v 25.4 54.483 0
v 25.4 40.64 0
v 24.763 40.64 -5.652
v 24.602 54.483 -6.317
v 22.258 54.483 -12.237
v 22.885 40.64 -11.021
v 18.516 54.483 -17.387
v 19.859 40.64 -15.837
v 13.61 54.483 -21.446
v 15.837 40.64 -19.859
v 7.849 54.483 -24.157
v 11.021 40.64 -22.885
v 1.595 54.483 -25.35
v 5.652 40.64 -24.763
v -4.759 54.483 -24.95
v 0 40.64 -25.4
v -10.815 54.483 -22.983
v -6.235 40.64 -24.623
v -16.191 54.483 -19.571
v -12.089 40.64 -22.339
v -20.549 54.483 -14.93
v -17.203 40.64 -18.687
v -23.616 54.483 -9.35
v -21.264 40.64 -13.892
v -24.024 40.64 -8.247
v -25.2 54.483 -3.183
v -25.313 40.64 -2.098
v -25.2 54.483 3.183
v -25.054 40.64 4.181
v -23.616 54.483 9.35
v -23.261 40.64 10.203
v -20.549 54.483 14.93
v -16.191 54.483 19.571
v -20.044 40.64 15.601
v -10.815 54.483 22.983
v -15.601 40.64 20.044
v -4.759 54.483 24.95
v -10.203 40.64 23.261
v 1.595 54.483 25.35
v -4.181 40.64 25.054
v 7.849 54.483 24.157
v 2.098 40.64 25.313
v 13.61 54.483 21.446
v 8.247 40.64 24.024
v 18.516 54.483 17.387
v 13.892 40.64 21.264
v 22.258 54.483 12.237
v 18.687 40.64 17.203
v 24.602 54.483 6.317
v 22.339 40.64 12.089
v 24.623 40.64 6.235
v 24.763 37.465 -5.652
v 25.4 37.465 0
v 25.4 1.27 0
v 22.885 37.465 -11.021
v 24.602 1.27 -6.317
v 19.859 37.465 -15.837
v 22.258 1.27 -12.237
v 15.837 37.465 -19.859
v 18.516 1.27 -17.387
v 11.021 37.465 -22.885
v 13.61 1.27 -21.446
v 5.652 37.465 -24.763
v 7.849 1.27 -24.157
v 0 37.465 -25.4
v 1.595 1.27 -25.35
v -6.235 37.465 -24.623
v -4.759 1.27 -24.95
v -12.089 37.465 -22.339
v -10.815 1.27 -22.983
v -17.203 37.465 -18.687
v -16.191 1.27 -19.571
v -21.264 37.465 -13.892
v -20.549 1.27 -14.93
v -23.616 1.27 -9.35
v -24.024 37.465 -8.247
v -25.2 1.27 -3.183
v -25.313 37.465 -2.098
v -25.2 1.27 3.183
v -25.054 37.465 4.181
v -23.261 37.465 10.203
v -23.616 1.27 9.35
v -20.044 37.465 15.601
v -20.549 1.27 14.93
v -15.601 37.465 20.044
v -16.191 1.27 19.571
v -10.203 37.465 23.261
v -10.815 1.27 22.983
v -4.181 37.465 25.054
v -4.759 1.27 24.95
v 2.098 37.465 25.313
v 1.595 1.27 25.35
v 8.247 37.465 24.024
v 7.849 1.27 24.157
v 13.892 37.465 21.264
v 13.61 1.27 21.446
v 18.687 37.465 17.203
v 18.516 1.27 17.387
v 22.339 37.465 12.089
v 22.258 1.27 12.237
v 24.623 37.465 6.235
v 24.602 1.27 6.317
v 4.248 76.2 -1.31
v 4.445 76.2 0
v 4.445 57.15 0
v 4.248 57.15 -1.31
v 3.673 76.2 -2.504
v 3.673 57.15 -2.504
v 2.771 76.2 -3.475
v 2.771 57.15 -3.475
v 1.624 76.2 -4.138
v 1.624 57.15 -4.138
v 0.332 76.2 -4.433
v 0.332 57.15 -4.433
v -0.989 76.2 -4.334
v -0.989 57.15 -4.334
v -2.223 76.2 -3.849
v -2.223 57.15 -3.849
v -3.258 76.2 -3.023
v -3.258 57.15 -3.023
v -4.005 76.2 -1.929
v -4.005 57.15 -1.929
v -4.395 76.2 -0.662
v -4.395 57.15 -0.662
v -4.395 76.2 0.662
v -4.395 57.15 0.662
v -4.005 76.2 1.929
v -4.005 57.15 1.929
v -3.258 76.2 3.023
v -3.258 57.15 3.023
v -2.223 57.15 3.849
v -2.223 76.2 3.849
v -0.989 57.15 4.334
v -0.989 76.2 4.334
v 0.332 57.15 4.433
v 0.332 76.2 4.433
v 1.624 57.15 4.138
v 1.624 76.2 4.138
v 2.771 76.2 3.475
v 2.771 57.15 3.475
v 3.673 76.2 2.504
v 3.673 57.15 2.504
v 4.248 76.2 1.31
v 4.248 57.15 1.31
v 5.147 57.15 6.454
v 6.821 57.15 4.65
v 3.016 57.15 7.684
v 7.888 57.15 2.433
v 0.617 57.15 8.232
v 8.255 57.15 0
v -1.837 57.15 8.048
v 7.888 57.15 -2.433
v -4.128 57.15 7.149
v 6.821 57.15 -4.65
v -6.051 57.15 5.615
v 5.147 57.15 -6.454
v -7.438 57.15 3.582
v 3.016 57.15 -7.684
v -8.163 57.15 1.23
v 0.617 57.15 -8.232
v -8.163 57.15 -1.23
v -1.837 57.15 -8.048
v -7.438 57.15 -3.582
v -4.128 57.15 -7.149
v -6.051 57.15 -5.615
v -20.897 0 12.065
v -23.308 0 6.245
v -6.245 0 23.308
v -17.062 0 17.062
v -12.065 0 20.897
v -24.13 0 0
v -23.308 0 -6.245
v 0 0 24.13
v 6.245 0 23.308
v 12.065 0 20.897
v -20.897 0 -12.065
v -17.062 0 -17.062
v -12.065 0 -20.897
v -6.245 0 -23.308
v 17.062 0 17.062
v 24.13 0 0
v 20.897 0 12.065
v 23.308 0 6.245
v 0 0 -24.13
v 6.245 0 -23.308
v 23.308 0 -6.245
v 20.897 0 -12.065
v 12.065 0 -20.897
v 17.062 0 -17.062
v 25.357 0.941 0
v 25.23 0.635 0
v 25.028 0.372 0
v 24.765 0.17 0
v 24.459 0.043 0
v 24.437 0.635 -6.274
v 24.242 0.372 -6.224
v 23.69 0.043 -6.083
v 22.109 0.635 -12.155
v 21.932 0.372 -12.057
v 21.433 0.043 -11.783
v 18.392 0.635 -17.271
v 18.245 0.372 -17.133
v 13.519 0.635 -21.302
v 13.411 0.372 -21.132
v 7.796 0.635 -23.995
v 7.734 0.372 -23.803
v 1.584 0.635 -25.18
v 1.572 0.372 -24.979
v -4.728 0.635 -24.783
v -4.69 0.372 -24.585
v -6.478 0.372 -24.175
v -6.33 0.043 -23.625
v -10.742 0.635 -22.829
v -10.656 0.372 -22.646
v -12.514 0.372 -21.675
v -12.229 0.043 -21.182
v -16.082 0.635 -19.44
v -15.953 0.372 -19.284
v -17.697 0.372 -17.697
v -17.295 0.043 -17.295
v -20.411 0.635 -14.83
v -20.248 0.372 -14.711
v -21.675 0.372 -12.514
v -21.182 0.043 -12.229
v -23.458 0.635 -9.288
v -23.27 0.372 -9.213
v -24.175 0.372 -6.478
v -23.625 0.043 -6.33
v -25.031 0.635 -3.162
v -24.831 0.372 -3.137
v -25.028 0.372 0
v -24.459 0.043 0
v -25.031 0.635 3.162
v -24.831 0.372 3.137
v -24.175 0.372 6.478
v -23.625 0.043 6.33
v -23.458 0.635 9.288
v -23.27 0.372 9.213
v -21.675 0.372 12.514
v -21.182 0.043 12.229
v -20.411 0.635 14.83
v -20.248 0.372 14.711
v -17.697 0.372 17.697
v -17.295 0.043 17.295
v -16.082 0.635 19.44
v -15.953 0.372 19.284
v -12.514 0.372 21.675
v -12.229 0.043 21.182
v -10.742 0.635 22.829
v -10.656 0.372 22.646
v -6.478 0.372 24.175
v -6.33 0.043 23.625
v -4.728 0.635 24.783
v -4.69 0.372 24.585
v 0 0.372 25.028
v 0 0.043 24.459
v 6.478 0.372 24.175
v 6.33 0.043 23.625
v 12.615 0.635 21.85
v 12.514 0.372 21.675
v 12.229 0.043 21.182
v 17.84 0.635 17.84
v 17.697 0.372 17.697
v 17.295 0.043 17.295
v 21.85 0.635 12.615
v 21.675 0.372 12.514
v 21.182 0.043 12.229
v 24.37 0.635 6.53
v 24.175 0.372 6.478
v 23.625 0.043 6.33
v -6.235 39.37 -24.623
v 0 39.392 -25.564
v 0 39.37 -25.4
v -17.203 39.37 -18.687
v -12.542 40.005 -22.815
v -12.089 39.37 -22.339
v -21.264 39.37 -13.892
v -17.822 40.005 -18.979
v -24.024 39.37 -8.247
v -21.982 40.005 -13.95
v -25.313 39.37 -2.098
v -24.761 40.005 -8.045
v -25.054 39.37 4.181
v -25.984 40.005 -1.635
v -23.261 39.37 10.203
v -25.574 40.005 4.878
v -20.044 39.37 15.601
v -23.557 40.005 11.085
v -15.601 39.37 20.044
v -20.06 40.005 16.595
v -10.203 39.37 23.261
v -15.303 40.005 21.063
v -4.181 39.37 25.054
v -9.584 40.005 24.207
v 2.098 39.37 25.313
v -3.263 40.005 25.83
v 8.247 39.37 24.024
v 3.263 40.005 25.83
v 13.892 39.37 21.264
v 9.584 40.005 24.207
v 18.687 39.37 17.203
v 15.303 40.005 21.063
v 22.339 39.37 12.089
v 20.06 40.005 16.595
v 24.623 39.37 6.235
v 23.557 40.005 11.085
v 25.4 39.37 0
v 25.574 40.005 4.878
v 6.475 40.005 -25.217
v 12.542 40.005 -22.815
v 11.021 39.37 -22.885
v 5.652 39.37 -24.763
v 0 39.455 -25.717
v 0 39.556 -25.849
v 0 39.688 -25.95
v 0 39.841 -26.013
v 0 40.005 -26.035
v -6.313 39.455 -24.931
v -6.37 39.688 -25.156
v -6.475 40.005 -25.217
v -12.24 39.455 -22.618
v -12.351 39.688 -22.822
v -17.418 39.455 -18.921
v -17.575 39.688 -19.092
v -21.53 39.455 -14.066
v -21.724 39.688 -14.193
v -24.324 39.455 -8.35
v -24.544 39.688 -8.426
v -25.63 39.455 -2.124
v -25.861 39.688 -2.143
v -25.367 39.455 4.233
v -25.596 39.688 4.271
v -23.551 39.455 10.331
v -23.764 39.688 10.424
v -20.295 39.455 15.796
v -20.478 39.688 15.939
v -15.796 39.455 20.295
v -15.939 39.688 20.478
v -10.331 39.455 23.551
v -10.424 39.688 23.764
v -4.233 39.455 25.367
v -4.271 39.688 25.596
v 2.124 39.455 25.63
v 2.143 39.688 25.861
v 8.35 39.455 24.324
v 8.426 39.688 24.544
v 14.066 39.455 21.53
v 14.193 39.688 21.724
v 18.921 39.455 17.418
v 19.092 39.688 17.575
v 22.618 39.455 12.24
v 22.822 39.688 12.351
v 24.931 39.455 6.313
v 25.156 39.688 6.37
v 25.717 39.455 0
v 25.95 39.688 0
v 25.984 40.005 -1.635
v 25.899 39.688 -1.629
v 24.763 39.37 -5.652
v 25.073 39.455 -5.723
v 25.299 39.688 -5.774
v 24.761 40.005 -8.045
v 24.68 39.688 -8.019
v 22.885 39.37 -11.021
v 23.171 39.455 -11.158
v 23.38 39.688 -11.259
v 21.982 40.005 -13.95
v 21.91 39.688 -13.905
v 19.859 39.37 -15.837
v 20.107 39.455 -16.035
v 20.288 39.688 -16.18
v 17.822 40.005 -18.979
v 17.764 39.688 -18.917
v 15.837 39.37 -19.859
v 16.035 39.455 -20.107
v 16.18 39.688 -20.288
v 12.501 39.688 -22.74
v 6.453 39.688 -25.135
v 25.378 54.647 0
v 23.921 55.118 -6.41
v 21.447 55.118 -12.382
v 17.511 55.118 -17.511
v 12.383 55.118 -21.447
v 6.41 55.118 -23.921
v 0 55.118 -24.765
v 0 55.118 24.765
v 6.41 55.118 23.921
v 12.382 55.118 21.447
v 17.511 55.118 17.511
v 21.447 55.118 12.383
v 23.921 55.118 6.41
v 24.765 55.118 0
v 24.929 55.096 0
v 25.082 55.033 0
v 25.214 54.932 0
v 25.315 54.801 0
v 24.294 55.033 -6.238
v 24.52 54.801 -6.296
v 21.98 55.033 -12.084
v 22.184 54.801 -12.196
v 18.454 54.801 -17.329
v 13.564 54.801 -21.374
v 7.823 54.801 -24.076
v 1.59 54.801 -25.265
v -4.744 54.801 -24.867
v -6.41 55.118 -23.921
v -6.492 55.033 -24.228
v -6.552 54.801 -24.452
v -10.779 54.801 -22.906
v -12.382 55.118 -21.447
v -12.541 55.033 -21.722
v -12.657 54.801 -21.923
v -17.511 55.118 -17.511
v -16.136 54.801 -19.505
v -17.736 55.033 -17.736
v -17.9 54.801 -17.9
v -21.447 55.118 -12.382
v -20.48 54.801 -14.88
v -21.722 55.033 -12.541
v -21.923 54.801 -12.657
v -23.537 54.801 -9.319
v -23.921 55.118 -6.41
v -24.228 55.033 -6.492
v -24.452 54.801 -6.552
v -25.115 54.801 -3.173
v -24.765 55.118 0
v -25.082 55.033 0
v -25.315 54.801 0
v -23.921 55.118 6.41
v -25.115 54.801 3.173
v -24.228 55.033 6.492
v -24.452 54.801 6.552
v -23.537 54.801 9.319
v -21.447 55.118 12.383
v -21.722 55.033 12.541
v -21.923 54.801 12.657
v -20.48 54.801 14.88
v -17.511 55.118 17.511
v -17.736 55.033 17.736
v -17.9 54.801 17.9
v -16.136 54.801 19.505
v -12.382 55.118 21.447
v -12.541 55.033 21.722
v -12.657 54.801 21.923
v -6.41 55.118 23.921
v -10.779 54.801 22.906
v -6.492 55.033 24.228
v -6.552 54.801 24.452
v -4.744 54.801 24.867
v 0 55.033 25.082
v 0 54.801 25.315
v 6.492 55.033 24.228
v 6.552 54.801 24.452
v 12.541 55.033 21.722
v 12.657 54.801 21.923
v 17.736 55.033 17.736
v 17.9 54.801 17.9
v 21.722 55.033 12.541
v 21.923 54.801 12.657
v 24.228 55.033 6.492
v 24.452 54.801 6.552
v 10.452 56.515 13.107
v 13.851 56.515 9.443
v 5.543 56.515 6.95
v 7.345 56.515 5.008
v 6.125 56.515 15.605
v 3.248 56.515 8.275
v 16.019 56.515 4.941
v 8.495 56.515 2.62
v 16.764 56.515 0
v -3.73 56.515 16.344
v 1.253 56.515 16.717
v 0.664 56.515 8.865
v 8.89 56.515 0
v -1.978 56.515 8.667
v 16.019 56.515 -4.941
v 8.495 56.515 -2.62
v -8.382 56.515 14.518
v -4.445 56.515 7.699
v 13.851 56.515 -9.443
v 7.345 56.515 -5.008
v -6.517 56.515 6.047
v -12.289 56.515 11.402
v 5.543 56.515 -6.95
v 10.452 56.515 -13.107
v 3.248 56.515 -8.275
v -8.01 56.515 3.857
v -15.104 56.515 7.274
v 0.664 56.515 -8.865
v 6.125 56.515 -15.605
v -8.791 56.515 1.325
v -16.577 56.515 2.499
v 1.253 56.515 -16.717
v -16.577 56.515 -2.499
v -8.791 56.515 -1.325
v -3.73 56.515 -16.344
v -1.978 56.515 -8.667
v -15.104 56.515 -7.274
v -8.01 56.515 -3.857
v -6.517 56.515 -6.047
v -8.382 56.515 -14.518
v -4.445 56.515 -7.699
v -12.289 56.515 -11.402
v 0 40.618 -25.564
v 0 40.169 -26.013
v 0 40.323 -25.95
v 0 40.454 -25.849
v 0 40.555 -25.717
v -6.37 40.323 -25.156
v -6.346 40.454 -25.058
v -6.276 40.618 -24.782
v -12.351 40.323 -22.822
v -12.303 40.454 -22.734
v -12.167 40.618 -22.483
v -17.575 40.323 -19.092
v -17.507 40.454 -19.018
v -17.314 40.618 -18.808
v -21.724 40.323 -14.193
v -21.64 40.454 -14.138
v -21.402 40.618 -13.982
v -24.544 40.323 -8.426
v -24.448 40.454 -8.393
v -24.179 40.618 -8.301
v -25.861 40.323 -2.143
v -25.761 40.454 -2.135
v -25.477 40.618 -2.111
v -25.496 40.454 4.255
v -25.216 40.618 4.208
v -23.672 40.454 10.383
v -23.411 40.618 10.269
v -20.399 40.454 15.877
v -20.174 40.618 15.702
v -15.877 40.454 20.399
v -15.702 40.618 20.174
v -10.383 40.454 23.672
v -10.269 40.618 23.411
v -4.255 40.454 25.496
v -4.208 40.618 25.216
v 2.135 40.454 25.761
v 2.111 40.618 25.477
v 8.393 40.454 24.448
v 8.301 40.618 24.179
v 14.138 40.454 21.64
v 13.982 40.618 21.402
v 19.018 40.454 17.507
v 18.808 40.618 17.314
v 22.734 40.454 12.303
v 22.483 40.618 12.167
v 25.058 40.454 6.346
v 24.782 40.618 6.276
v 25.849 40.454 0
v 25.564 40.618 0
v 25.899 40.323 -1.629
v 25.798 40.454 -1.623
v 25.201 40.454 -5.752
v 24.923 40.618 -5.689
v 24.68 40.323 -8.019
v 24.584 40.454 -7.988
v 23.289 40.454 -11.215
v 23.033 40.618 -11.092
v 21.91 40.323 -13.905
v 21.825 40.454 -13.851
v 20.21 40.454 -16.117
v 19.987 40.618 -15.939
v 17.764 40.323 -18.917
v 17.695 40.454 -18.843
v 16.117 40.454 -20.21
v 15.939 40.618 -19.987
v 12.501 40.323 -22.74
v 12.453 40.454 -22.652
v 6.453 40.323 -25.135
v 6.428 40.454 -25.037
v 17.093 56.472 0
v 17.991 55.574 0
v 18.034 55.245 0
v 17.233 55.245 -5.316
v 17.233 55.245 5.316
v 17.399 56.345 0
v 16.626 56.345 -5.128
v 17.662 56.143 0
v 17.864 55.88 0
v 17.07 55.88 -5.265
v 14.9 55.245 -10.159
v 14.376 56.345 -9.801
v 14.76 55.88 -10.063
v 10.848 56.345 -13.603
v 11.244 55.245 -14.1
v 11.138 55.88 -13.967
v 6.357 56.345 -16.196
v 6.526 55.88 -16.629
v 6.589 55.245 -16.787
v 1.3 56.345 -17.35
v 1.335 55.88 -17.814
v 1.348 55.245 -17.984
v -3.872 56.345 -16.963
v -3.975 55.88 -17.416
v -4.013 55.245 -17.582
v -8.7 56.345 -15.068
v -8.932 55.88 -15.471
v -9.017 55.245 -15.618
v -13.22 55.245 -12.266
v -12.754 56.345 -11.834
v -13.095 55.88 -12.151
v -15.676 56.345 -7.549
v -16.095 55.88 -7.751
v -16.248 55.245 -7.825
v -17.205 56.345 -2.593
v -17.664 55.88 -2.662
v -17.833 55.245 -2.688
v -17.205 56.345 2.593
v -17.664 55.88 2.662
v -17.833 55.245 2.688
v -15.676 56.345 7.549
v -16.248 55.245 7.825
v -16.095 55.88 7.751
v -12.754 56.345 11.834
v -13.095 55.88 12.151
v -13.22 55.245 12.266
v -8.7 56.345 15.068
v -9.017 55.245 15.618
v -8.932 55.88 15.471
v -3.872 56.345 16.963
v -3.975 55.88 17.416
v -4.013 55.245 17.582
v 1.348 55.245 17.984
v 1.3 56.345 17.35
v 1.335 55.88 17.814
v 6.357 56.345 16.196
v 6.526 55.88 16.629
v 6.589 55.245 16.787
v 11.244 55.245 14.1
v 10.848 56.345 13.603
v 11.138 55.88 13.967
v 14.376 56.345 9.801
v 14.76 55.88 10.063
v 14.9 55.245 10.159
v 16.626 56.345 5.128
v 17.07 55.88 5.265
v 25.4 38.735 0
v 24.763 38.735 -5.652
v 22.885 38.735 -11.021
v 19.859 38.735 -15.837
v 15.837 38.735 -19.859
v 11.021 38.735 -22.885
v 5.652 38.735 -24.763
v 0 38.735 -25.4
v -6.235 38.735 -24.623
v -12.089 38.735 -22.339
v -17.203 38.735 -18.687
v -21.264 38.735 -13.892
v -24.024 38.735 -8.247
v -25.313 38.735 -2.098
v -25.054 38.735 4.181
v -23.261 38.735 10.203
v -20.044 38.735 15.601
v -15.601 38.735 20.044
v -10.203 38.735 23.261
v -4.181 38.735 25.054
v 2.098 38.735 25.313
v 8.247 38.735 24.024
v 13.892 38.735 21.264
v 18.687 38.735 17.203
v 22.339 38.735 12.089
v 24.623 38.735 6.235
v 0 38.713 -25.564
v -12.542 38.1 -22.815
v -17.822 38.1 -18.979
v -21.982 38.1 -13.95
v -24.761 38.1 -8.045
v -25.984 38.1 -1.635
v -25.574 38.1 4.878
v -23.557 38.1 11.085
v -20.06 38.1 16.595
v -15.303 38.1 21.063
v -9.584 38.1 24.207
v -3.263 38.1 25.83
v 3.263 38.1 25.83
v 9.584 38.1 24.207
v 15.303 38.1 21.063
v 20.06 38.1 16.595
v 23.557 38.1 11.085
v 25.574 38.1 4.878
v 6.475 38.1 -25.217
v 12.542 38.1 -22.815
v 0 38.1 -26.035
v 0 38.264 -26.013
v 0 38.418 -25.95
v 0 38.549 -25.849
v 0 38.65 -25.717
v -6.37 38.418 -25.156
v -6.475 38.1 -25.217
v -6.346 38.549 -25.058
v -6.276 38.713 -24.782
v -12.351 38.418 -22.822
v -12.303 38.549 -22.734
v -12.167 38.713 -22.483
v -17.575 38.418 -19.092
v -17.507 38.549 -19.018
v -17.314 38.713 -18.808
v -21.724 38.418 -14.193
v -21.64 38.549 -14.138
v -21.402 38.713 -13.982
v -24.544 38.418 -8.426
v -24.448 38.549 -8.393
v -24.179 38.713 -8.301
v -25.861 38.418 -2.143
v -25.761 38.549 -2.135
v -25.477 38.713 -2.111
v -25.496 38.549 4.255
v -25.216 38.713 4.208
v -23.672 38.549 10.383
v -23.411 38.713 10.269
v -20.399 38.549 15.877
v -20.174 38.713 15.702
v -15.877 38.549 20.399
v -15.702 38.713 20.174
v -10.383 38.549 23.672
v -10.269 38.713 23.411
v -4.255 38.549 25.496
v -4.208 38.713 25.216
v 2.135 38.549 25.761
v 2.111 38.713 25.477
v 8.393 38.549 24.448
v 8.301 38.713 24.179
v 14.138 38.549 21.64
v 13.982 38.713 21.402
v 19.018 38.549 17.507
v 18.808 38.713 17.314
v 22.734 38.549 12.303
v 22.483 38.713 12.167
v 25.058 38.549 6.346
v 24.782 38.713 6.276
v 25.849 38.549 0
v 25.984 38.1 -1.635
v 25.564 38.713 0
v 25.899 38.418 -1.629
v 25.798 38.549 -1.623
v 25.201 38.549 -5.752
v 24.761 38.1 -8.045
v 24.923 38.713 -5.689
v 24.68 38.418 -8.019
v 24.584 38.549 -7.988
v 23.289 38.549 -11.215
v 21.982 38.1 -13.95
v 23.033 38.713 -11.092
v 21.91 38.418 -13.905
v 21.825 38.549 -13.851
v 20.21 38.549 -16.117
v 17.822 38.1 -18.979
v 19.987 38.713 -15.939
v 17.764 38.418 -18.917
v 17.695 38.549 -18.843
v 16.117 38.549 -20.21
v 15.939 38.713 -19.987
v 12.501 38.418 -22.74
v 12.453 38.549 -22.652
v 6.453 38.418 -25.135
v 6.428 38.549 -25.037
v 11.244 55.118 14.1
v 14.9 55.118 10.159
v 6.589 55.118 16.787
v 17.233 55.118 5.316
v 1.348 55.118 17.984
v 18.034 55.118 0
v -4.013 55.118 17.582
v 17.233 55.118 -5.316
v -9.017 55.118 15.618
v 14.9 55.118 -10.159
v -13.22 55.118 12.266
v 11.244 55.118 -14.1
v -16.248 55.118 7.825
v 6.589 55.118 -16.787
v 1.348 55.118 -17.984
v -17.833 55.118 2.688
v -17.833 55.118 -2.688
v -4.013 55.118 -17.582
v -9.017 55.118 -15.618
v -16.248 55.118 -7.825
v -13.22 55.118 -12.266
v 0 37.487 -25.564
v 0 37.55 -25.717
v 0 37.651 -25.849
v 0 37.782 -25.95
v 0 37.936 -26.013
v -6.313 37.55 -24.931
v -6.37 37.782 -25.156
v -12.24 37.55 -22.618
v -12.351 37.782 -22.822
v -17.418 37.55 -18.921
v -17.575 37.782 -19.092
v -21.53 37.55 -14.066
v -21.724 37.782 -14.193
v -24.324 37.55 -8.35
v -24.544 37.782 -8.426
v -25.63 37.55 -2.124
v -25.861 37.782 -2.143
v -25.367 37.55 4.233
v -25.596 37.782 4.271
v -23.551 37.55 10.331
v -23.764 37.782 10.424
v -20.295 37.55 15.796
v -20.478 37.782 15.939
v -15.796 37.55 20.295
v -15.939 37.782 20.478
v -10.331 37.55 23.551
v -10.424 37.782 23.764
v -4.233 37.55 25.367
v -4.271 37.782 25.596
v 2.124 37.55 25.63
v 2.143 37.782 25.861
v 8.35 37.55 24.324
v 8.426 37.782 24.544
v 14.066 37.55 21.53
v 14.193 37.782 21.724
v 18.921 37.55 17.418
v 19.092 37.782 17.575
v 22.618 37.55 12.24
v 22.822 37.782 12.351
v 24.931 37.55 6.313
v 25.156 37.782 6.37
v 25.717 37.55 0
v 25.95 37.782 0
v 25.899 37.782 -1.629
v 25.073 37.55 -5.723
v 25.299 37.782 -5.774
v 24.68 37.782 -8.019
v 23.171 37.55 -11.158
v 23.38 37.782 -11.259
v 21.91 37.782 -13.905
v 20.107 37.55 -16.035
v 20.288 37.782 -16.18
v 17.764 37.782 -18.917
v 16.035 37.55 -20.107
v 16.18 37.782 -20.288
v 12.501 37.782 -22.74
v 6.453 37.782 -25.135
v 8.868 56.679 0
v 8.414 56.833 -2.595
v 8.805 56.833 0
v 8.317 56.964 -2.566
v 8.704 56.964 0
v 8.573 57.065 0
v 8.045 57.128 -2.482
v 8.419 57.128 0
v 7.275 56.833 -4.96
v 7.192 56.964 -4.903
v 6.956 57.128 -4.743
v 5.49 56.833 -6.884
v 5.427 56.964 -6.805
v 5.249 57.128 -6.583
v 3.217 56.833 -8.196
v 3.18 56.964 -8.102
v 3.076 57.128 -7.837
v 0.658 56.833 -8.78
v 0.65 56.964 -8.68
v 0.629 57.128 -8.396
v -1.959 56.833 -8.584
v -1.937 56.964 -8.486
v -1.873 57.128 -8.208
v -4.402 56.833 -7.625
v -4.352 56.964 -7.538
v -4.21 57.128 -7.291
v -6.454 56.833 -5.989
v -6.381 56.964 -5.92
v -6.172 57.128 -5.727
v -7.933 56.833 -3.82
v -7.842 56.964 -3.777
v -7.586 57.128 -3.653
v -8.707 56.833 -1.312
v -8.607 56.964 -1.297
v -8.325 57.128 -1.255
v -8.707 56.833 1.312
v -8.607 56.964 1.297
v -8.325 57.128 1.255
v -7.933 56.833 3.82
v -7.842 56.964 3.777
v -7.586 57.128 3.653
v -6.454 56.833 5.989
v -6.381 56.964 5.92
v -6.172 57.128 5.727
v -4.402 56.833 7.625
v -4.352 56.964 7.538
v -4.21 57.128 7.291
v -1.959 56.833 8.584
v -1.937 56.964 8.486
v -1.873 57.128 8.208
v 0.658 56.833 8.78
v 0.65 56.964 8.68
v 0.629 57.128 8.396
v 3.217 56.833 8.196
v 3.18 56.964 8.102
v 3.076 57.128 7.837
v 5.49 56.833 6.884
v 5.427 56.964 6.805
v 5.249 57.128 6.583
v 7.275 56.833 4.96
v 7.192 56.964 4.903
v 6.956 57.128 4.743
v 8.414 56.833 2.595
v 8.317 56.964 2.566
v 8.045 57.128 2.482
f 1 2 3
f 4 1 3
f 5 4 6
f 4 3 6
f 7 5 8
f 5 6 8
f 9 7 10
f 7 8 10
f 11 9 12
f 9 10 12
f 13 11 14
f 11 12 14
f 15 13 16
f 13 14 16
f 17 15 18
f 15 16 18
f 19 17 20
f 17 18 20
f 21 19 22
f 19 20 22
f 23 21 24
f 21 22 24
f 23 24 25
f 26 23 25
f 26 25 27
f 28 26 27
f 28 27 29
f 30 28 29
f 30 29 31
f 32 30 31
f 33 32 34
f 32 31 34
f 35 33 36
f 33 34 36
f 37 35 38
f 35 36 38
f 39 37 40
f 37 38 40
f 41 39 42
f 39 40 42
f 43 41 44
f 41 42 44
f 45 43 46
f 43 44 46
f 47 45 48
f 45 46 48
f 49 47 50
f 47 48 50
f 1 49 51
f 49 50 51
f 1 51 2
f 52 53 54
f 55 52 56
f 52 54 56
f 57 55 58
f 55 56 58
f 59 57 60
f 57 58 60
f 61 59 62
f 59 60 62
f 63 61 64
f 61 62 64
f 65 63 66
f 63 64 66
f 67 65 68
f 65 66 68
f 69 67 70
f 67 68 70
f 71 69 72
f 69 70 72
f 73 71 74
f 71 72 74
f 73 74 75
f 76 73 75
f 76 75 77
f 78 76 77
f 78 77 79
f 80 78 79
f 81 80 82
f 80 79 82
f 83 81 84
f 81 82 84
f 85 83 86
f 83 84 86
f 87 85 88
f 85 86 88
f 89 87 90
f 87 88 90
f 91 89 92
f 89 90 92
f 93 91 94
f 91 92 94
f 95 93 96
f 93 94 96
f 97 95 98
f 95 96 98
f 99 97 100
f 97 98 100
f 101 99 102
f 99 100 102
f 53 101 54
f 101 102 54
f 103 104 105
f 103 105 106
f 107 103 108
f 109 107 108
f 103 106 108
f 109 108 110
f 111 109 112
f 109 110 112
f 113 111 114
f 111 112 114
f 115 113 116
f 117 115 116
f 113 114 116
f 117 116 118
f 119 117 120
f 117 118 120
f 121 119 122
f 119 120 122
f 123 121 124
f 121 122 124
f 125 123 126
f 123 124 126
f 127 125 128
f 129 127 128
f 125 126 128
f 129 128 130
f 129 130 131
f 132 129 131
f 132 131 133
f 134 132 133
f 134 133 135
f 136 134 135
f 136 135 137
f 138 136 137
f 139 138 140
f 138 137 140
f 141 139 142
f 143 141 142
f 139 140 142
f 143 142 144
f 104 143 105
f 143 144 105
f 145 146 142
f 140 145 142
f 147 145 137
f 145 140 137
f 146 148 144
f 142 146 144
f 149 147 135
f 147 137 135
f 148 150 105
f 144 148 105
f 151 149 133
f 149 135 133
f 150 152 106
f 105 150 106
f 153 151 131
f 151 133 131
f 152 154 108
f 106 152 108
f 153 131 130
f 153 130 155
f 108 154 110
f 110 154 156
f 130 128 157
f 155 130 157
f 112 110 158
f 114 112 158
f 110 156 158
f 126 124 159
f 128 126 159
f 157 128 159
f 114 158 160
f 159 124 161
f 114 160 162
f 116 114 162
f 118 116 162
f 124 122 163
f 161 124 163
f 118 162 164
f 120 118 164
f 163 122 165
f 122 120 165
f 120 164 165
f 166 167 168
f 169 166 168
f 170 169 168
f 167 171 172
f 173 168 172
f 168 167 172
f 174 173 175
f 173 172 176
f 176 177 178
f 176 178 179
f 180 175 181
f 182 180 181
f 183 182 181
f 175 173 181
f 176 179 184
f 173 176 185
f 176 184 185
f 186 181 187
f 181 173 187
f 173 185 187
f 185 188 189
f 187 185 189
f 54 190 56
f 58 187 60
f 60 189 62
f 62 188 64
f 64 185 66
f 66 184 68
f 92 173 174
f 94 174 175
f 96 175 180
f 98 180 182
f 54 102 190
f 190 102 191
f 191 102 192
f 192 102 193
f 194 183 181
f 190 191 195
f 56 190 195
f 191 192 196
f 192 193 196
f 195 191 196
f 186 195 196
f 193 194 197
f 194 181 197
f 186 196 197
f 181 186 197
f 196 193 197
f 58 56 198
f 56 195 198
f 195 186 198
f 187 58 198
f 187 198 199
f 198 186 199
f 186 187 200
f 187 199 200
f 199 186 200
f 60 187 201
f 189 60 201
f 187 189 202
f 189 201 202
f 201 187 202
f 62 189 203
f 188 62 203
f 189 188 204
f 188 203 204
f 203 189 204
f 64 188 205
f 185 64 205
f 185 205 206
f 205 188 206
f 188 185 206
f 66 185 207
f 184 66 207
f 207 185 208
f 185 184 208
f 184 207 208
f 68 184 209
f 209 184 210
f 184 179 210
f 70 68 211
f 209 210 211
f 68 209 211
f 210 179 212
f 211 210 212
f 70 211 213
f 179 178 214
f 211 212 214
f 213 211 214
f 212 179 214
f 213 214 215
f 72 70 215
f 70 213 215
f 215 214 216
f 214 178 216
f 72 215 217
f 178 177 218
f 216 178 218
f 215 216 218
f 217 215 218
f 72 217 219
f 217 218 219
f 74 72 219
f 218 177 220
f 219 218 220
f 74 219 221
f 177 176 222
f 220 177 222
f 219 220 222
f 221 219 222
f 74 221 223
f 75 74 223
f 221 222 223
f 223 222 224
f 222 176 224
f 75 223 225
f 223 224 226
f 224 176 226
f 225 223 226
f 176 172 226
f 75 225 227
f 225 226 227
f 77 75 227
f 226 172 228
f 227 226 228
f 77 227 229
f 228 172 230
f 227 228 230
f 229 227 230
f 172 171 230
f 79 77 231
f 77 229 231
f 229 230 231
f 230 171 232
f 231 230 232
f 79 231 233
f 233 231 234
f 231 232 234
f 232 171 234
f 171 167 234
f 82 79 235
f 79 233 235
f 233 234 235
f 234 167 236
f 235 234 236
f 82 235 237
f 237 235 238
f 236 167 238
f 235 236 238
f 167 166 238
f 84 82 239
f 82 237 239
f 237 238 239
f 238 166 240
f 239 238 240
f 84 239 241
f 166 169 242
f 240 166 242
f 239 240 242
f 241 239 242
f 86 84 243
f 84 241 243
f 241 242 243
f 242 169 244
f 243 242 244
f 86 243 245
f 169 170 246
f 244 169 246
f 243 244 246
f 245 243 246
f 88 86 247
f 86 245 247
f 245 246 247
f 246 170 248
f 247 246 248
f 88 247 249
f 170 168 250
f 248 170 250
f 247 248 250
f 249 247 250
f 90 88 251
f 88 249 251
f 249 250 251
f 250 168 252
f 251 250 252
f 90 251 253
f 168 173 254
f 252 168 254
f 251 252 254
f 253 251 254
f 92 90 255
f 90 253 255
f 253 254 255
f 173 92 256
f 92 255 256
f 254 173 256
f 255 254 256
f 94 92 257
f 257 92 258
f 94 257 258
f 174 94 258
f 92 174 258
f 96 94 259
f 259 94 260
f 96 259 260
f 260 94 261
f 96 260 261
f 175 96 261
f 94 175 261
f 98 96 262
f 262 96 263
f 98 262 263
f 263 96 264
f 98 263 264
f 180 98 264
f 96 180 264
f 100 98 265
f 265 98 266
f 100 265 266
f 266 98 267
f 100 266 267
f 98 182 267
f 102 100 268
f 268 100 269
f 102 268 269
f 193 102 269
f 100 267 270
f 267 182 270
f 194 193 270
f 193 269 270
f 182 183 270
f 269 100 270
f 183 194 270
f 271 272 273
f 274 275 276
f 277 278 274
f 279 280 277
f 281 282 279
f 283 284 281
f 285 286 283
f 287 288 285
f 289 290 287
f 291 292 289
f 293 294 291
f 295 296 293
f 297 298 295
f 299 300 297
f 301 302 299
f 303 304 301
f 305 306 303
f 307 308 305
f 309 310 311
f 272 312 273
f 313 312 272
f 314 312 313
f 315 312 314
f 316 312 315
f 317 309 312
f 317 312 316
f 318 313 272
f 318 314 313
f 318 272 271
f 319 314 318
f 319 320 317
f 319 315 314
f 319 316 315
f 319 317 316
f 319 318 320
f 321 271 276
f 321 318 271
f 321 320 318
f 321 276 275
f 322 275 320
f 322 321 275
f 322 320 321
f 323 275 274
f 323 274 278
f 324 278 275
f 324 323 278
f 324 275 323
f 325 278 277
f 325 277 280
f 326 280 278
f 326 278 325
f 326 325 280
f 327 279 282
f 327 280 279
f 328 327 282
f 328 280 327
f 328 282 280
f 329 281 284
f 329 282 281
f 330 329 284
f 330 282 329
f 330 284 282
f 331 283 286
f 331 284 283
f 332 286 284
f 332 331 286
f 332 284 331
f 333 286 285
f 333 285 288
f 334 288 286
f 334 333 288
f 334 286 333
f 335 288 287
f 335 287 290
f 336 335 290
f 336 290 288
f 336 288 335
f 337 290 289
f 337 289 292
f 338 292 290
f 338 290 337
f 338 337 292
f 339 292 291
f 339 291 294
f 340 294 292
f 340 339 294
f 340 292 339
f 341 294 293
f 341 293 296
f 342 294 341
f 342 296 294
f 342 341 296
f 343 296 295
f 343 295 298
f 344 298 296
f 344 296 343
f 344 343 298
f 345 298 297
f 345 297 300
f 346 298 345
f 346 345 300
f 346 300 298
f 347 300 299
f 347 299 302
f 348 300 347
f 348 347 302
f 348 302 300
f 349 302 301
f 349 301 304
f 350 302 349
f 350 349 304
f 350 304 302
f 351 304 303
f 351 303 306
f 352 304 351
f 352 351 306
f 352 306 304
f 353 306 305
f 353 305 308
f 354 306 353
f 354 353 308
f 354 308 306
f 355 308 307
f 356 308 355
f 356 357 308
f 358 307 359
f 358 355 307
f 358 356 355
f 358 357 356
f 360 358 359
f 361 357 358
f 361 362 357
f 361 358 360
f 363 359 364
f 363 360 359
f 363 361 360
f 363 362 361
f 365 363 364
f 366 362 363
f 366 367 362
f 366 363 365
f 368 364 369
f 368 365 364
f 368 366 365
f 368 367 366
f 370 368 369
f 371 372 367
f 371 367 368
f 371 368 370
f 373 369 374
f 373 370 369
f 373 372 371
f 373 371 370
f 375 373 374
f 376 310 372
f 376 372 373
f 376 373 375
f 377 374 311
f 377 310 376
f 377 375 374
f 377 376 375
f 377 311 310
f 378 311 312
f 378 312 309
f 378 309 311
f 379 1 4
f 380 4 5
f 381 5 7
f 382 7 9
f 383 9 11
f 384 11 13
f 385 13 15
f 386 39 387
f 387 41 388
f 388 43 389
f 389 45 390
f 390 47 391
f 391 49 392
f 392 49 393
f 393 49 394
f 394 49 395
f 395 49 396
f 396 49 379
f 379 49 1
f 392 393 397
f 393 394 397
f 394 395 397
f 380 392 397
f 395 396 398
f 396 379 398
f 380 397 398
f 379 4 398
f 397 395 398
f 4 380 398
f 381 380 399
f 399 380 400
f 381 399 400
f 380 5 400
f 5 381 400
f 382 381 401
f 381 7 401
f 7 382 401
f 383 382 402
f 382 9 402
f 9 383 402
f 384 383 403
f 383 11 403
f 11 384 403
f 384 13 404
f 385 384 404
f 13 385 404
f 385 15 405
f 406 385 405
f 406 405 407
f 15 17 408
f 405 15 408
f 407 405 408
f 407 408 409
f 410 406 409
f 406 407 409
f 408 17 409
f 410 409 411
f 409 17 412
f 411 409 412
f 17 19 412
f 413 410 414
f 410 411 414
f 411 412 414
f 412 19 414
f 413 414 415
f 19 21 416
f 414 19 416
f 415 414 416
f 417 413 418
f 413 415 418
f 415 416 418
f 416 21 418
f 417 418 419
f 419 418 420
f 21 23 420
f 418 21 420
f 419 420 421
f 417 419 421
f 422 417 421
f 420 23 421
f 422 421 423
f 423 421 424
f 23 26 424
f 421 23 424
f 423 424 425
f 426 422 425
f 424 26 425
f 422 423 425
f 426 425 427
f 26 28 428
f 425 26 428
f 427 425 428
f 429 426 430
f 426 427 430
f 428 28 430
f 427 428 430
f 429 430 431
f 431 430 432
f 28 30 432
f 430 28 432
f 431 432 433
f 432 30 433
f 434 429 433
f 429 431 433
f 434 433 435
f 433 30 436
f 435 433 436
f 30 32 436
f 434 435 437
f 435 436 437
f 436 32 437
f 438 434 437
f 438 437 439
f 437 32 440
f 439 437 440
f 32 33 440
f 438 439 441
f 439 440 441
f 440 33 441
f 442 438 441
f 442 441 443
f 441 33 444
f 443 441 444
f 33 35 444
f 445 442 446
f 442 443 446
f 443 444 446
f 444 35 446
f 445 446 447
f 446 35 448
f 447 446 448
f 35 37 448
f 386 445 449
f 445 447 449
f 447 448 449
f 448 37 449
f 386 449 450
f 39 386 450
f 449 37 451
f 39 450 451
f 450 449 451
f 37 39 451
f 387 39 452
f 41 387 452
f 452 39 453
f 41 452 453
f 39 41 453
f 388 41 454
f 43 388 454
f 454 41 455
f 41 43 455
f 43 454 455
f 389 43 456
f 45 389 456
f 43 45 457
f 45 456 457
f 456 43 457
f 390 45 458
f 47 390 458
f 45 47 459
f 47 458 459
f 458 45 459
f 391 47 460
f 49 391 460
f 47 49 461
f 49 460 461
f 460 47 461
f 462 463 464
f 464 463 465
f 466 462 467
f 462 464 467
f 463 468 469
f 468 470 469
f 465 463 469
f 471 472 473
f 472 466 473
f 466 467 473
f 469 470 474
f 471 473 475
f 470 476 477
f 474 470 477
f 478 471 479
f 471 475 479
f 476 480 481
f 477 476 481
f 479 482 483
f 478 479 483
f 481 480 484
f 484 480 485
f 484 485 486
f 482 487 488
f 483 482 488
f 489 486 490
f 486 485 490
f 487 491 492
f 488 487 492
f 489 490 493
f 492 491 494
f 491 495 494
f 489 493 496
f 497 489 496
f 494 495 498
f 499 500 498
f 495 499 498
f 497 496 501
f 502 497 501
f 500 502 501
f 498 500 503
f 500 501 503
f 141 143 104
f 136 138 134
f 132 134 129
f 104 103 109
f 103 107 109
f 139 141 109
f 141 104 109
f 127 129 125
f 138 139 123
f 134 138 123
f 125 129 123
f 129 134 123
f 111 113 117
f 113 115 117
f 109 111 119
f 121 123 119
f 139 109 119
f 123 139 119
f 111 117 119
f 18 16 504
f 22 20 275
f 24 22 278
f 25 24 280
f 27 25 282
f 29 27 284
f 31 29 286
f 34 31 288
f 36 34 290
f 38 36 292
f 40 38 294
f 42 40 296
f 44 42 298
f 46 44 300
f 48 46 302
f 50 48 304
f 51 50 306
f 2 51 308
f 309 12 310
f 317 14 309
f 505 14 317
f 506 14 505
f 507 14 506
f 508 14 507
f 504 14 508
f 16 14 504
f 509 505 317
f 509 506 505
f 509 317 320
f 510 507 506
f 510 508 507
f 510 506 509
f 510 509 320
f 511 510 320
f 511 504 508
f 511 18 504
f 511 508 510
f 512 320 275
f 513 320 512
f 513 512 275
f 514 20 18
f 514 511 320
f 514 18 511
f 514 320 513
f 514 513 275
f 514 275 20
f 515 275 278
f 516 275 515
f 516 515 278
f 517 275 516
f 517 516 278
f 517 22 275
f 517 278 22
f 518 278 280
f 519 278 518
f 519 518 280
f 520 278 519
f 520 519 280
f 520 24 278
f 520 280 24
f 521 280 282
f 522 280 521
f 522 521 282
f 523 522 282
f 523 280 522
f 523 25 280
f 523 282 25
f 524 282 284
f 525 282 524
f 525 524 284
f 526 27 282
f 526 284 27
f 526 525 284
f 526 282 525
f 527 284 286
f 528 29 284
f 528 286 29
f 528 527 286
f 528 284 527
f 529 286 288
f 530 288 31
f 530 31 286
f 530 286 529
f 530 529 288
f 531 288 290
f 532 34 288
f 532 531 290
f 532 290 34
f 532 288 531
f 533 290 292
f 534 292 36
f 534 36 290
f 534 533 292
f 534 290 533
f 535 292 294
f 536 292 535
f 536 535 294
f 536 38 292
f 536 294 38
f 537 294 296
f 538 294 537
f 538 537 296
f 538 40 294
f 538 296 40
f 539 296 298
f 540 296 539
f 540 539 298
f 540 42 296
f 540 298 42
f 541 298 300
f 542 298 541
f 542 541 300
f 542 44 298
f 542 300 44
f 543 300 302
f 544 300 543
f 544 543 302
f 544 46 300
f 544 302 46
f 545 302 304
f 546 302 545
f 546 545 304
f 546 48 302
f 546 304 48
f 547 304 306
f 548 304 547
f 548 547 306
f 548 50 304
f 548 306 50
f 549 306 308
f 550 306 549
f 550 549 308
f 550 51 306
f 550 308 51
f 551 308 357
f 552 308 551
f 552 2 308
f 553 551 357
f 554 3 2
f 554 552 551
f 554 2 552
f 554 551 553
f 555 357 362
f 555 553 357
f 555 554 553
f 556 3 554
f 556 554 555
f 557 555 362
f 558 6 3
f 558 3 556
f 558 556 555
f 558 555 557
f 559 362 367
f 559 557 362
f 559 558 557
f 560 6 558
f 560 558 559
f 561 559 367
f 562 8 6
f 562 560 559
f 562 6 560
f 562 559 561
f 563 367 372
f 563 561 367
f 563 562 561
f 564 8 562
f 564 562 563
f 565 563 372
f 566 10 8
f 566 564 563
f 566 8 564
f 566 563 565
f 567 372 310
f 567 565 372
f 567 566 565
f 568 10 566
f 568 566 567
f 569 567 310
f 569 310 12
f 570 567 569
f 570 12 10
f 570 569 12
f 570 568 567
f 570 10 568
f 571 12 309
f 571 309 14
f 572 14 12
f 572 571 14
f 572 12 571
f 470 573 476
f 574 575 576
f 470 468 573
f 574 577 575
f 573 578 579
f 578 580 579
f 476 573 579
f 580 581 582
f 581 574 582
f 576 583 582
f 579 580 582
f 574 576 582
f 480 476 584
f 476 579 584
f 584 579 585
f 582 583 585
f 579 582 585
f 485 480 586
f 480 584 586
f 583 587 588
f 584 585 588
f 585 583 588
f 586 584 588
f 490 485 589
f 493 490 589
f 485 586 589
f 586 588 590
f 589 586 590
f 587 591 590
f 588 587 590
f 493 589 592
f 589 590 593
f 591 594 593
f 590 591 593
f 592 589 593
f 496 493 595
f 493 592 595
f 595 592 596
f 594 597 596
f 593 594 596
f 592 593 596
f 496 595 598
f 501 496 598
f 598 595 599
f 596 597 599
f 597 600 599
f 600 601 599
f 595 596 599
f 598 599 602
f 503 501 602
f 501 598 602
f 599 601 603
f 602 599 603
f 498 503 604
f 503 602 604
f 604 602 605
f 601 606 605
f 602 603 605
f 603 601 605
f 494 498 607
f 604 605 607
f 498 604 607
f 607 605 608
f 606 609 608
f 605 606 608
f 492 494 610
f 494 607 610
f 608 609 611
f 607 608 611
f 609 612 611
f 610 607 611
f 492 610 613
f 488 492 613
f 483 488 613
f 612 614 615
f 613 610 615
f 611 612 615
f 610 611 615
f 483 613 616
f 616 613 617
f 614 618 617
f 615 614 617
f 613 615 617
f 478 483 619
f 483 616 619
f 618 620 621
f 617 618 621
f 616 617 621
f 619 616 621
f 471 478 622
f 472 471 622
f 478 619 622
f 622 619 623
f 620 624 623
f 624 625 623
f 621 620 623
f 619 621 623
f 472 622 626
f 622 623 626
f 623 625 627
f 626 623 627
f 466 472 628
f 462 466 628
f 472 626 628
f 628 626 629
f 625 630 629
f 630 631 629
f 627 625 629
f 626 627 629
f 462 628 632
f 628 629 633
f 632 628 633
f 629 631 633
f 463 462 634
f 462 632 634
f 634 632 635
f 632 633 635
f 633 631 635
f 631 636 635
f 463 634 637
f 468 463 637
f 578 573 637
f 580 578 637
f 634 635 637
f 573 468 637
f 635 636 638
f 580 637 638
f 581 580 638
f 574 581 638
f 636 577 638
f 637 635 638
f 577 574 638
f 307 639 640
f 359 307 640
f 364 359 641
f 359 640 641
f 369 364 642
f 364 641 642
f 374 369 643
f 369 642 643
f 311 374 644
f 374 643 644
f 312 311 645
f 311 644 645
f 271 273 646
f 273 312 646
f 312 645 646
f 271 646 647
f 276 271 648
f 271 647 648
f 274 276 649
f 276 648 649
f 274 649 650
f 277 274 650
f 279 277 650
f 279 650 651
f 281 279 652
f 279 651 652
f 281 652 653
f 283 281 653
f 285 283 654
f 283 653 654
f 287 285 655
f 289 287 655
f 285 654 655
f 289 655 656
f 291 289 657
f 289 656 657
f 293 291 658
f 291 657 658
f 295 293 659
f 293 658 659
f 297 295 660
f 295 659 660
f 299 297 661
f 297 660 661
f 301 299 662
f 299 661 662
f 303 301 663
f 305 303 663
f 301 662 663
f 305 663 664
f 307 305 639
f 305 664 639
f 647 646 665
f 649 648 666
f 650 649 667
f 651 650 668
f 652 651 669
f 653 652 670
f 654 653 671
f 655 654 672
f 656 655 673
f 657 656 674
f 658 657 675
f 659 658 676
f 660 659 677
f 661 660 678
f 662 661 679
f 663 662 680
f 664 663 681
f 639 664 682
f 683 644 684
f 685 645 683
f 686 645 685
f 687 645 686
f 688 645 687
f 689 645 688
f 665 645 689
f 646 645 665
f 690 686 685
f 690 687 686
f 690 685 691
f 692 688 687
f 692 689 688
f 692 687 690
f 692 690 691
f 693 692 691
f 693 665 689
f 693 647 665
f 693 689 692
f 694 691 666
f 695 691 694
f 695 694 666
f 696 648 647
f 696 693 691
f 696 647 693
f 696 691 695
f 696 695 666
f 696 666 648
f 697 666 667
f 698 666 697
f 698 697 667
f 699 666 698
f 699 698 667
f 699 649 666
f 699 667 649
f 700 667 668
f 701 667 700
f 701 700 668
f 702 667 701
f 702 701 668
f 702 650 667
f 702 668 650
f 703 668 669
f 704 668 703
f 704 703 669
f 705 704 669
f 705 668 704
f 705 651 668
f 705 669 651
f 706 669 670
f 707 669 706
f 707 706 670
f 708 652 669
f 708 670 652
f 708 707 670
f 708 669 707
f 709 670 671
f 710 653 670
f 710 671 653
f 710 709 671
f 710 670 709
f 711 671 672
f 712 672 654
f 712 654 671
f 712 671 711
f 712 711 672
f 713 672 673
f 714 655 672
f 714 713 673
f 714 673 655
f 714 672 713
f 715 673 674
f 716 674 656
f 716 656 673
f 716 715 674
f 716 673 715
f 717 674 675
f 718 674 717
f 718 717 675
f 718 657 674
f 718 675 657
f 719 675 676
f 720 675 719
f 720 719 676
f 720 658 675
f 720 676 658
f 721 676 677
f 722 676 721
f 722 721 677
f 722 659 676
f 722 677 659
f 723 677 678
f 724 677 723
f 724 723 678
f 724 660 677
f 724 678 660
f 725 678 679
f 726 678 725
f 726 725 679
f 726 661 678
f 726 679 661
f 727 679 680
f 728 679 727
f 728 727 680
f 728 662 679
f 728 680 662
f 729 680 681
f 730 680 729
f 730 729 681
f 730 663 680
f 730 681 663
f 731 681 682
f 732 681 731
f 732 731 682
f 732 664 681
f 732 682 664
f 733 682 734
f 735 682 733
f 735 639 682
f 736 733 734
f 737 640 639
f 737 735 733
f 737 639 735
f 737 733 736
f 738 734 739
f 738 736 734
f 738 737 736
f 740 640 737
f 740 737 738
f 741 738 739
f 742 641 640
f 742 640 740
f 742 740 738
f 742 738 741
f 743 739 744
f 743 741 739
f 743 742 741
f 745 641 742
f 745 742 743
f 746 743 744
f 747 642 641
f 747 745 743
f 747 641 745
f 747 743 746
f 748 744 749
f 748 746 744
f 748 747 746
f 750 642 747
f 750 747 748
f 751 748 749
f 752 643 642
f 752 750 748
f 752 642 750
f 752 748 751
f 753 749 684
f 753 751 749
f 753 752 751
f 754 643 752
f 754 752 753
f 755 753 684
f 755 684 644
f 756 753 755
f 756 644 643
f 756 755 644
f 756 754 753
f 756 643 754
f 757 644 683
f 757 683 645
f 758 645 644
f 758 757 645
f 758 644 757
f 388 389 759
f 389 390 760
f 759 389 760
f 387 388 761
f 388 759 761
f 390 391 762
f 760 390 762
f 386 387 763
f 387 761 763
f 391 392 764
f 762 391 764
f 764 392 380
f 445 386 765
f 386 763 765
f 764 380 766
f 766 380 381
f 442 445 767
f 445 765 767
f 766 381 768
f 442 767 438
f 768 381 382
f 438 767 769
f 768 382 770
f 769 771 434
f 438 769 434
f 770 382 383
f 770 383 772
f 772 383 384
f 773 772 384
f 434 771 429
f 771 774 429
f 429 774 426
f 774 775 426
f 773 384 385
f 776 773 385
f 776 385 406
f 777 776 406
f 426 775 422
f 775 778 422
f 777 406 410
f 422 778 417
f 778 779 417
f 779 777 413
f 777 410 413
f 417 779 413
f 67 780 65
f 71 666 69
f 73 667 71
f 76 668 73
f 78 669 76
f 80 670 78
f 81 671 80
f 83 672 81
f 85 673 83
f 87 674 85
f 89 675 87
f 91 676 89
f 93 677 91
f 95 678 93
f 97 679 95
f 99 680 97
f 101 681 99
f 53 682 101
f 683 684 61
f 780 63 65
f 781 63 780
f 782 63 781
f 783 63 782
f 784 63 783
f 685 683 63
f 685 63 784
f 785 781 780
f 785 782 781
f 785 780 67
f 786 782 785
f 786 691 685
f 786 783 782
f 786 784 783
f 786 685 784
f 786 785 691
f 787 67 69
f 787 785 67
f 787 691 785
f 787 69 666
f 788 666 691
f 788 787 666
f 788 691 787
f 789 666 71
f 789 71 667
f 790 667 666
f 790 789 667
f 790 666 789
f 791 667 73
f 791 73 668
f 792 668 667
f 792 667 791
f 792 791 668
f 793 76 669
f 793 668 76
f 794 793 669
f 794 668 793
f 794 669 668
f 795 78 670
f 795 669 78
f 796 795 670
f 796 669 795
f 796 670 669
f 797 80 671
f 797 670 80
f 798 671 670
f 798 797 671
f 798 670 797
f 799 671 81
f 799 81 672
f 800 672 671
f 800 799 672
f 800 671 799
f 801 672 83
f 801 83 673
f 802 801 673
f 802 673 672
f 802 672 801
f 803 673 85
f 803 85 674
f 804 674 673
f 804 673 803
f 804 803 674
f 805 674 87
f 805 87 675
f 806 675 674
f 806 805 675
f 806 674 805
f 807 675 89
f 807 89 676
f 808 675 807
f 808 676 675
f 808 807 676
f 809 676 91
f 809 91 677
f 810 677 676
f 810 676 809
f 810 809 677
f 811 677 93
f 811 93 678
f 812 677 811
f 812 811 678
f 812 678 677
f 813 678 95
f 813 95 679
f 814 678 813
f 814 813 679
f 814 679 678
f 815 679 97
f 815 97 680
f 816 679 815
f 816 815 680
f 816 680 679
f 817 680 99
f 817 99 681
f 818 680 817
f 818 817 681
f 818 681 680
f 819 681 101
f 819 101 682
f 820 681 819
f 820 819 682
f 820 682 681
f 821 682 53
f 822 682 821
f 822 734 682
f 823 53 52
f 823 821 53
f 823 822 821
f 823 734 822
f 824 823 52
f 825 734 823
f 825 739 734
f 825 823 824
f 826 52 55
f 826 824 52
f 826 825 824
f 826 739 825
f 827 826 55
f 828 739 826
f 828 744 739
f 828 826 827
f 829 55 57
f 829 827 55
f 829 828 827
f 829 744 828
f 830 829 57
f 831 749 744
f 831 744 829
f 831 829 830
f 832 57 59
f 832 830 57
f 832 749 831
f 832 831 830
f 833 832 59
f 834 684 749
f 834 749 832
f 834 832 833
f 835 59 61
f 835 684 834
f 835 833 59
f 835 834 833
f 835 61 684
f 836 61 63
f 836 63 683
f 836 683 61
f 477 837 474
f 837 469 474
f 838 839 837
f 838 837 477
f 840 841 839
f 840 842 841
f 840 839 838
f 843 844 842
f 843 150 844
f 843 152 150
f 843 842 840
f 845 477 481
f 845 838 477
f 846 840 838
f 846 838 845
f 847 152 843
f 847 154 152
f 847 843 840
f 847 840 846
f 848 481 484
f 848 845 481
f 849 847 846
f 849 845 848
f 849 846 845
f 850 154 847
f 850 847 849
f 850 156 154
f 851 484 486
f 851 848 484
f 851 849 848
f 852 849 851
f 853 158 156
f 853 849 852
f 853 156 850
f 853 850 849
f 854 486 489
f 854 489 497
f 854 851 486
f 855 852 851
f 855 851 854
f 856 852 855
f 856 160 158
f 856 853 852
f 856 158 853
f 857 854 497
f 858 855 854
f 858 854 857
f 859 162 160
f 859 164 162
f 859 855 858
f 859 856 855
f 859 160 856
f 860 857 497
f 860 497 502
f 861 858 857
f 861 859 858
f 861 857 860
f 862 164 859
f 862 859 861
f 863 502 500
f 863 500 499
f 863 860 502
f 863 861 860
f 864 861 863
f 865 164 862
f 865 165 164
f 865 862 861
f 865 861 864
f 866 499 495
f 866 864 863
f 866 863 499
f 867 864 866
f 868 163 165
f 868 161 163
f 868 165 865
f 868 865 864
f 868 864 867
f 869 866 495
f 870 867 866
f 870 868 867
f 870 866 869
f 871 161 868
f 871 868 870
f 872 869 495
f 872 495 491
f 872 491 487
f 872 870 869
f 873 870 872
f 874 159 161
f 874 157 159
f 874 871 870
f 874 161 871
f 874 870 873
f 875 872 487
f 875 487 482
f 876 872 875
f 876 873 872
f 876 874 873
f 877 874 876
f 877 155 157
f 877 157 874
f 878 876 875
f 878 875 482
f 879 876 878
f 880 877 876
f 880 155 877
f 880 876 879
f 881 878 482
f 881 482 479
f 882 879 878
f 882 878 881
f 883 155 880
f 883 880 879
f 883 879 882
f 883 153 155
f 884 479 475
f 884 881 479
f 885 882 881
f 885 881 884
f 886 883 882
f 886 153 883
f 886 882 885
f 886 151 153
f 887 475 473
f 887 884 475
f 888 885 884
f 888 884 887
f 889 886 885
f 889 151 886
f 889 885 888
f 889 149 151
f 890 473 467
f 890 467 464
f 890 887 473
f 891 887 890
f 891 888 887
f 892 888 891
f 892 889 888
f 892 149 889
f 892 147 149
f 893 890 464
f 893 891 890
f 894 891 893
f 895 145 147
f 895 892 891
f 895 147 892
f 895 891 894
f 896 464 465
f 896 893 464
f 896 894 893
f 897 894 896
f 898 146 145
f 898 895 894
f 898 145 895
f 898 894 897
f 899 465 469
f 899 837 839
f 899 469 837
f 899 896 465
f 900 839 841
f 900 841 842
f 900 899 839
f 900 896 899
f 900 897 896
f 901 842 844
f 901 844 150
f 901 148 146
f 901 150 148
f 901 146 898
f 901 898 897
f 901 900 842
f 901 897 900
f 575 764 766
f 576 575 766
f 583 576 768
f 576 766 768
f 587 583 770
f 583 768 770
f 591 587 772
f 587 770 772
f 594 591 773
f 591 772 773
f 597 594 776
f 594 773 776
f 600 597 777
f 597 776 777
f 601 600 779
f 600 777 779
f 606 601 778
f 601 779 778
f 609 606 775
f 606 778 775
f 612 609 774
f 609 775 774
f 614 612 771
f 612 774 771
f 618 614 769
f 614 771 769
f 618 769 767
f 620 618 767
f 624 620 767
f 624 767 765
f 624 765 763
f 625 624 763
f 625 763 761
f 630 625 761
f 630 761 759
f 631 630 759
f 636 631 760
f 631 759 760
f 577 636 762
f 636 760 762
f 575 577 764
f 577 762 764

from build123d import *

# Parameters (mm, degrees)
SKETCH2_R = 0.635
FILLET1_R = 0.635
FILLET2_R = 1.27
FILLET3_R = 0.635


with BuildPart() as part:
    # Sketch1 → Revolve1 (revolve)
    with BuildSketch(Plane.XY):
        Polygon((0, 0), (0, 76.2), (4.445, 76.2), (4.445, 57.15), (8.89, 57.15), (8.89, 56.515), (18.034, 56.515), (18.034, 55.118), (25.4, 55.118), (25.4, 0), align=None)
    revolve(axis=Axis((0, 0, 0), (0, 1, 0)))

    # Sketch2 → Revolve2 (revolve)
    with BuildSketch(Plane.XY, mode=Mode.PRIVATE) as revolve2_sk:
        with Locations((25.4, 40.005)):
            Circle(SKETCH2_R)
        with Locations((25.4, 38.1)):
            Circle(SKETCH2_R)
    revolve(revolve2_sk.sketch.rotate(Axis((0, 0, 0), (0, 1, 0)), 90), axis=Axis((0, 0, 0), (0, 1, 0)))

    # Fillet1
    fillet1_edges = [part.edges().sort_by_distance(p)[0] for p in [
        (-8.89, 57.15, 0),
    ]]
    fillet(fillet1_edges, radius=FILLET1_R - 0.0001)  # a hair under: the kernel refuses the full size

    # Fillet2
    fillet2_edges = [part.edges().sort_by_distance(p)[0] for p in [
        (-25.4, 0, 0),
        (-18.034, 56.515, 0),
    ]]
    fillet(fillet2_edges, radius=FILLET2_R)

    # Fillet3
    fillet3_edges = [part.edges().sort_by_distance(p)[0] for p in [
        (-25.4, 55.118, 0),
    ]]
    fillet(fillet3_edges, radius=FILLET3_R)


solid = part.part
